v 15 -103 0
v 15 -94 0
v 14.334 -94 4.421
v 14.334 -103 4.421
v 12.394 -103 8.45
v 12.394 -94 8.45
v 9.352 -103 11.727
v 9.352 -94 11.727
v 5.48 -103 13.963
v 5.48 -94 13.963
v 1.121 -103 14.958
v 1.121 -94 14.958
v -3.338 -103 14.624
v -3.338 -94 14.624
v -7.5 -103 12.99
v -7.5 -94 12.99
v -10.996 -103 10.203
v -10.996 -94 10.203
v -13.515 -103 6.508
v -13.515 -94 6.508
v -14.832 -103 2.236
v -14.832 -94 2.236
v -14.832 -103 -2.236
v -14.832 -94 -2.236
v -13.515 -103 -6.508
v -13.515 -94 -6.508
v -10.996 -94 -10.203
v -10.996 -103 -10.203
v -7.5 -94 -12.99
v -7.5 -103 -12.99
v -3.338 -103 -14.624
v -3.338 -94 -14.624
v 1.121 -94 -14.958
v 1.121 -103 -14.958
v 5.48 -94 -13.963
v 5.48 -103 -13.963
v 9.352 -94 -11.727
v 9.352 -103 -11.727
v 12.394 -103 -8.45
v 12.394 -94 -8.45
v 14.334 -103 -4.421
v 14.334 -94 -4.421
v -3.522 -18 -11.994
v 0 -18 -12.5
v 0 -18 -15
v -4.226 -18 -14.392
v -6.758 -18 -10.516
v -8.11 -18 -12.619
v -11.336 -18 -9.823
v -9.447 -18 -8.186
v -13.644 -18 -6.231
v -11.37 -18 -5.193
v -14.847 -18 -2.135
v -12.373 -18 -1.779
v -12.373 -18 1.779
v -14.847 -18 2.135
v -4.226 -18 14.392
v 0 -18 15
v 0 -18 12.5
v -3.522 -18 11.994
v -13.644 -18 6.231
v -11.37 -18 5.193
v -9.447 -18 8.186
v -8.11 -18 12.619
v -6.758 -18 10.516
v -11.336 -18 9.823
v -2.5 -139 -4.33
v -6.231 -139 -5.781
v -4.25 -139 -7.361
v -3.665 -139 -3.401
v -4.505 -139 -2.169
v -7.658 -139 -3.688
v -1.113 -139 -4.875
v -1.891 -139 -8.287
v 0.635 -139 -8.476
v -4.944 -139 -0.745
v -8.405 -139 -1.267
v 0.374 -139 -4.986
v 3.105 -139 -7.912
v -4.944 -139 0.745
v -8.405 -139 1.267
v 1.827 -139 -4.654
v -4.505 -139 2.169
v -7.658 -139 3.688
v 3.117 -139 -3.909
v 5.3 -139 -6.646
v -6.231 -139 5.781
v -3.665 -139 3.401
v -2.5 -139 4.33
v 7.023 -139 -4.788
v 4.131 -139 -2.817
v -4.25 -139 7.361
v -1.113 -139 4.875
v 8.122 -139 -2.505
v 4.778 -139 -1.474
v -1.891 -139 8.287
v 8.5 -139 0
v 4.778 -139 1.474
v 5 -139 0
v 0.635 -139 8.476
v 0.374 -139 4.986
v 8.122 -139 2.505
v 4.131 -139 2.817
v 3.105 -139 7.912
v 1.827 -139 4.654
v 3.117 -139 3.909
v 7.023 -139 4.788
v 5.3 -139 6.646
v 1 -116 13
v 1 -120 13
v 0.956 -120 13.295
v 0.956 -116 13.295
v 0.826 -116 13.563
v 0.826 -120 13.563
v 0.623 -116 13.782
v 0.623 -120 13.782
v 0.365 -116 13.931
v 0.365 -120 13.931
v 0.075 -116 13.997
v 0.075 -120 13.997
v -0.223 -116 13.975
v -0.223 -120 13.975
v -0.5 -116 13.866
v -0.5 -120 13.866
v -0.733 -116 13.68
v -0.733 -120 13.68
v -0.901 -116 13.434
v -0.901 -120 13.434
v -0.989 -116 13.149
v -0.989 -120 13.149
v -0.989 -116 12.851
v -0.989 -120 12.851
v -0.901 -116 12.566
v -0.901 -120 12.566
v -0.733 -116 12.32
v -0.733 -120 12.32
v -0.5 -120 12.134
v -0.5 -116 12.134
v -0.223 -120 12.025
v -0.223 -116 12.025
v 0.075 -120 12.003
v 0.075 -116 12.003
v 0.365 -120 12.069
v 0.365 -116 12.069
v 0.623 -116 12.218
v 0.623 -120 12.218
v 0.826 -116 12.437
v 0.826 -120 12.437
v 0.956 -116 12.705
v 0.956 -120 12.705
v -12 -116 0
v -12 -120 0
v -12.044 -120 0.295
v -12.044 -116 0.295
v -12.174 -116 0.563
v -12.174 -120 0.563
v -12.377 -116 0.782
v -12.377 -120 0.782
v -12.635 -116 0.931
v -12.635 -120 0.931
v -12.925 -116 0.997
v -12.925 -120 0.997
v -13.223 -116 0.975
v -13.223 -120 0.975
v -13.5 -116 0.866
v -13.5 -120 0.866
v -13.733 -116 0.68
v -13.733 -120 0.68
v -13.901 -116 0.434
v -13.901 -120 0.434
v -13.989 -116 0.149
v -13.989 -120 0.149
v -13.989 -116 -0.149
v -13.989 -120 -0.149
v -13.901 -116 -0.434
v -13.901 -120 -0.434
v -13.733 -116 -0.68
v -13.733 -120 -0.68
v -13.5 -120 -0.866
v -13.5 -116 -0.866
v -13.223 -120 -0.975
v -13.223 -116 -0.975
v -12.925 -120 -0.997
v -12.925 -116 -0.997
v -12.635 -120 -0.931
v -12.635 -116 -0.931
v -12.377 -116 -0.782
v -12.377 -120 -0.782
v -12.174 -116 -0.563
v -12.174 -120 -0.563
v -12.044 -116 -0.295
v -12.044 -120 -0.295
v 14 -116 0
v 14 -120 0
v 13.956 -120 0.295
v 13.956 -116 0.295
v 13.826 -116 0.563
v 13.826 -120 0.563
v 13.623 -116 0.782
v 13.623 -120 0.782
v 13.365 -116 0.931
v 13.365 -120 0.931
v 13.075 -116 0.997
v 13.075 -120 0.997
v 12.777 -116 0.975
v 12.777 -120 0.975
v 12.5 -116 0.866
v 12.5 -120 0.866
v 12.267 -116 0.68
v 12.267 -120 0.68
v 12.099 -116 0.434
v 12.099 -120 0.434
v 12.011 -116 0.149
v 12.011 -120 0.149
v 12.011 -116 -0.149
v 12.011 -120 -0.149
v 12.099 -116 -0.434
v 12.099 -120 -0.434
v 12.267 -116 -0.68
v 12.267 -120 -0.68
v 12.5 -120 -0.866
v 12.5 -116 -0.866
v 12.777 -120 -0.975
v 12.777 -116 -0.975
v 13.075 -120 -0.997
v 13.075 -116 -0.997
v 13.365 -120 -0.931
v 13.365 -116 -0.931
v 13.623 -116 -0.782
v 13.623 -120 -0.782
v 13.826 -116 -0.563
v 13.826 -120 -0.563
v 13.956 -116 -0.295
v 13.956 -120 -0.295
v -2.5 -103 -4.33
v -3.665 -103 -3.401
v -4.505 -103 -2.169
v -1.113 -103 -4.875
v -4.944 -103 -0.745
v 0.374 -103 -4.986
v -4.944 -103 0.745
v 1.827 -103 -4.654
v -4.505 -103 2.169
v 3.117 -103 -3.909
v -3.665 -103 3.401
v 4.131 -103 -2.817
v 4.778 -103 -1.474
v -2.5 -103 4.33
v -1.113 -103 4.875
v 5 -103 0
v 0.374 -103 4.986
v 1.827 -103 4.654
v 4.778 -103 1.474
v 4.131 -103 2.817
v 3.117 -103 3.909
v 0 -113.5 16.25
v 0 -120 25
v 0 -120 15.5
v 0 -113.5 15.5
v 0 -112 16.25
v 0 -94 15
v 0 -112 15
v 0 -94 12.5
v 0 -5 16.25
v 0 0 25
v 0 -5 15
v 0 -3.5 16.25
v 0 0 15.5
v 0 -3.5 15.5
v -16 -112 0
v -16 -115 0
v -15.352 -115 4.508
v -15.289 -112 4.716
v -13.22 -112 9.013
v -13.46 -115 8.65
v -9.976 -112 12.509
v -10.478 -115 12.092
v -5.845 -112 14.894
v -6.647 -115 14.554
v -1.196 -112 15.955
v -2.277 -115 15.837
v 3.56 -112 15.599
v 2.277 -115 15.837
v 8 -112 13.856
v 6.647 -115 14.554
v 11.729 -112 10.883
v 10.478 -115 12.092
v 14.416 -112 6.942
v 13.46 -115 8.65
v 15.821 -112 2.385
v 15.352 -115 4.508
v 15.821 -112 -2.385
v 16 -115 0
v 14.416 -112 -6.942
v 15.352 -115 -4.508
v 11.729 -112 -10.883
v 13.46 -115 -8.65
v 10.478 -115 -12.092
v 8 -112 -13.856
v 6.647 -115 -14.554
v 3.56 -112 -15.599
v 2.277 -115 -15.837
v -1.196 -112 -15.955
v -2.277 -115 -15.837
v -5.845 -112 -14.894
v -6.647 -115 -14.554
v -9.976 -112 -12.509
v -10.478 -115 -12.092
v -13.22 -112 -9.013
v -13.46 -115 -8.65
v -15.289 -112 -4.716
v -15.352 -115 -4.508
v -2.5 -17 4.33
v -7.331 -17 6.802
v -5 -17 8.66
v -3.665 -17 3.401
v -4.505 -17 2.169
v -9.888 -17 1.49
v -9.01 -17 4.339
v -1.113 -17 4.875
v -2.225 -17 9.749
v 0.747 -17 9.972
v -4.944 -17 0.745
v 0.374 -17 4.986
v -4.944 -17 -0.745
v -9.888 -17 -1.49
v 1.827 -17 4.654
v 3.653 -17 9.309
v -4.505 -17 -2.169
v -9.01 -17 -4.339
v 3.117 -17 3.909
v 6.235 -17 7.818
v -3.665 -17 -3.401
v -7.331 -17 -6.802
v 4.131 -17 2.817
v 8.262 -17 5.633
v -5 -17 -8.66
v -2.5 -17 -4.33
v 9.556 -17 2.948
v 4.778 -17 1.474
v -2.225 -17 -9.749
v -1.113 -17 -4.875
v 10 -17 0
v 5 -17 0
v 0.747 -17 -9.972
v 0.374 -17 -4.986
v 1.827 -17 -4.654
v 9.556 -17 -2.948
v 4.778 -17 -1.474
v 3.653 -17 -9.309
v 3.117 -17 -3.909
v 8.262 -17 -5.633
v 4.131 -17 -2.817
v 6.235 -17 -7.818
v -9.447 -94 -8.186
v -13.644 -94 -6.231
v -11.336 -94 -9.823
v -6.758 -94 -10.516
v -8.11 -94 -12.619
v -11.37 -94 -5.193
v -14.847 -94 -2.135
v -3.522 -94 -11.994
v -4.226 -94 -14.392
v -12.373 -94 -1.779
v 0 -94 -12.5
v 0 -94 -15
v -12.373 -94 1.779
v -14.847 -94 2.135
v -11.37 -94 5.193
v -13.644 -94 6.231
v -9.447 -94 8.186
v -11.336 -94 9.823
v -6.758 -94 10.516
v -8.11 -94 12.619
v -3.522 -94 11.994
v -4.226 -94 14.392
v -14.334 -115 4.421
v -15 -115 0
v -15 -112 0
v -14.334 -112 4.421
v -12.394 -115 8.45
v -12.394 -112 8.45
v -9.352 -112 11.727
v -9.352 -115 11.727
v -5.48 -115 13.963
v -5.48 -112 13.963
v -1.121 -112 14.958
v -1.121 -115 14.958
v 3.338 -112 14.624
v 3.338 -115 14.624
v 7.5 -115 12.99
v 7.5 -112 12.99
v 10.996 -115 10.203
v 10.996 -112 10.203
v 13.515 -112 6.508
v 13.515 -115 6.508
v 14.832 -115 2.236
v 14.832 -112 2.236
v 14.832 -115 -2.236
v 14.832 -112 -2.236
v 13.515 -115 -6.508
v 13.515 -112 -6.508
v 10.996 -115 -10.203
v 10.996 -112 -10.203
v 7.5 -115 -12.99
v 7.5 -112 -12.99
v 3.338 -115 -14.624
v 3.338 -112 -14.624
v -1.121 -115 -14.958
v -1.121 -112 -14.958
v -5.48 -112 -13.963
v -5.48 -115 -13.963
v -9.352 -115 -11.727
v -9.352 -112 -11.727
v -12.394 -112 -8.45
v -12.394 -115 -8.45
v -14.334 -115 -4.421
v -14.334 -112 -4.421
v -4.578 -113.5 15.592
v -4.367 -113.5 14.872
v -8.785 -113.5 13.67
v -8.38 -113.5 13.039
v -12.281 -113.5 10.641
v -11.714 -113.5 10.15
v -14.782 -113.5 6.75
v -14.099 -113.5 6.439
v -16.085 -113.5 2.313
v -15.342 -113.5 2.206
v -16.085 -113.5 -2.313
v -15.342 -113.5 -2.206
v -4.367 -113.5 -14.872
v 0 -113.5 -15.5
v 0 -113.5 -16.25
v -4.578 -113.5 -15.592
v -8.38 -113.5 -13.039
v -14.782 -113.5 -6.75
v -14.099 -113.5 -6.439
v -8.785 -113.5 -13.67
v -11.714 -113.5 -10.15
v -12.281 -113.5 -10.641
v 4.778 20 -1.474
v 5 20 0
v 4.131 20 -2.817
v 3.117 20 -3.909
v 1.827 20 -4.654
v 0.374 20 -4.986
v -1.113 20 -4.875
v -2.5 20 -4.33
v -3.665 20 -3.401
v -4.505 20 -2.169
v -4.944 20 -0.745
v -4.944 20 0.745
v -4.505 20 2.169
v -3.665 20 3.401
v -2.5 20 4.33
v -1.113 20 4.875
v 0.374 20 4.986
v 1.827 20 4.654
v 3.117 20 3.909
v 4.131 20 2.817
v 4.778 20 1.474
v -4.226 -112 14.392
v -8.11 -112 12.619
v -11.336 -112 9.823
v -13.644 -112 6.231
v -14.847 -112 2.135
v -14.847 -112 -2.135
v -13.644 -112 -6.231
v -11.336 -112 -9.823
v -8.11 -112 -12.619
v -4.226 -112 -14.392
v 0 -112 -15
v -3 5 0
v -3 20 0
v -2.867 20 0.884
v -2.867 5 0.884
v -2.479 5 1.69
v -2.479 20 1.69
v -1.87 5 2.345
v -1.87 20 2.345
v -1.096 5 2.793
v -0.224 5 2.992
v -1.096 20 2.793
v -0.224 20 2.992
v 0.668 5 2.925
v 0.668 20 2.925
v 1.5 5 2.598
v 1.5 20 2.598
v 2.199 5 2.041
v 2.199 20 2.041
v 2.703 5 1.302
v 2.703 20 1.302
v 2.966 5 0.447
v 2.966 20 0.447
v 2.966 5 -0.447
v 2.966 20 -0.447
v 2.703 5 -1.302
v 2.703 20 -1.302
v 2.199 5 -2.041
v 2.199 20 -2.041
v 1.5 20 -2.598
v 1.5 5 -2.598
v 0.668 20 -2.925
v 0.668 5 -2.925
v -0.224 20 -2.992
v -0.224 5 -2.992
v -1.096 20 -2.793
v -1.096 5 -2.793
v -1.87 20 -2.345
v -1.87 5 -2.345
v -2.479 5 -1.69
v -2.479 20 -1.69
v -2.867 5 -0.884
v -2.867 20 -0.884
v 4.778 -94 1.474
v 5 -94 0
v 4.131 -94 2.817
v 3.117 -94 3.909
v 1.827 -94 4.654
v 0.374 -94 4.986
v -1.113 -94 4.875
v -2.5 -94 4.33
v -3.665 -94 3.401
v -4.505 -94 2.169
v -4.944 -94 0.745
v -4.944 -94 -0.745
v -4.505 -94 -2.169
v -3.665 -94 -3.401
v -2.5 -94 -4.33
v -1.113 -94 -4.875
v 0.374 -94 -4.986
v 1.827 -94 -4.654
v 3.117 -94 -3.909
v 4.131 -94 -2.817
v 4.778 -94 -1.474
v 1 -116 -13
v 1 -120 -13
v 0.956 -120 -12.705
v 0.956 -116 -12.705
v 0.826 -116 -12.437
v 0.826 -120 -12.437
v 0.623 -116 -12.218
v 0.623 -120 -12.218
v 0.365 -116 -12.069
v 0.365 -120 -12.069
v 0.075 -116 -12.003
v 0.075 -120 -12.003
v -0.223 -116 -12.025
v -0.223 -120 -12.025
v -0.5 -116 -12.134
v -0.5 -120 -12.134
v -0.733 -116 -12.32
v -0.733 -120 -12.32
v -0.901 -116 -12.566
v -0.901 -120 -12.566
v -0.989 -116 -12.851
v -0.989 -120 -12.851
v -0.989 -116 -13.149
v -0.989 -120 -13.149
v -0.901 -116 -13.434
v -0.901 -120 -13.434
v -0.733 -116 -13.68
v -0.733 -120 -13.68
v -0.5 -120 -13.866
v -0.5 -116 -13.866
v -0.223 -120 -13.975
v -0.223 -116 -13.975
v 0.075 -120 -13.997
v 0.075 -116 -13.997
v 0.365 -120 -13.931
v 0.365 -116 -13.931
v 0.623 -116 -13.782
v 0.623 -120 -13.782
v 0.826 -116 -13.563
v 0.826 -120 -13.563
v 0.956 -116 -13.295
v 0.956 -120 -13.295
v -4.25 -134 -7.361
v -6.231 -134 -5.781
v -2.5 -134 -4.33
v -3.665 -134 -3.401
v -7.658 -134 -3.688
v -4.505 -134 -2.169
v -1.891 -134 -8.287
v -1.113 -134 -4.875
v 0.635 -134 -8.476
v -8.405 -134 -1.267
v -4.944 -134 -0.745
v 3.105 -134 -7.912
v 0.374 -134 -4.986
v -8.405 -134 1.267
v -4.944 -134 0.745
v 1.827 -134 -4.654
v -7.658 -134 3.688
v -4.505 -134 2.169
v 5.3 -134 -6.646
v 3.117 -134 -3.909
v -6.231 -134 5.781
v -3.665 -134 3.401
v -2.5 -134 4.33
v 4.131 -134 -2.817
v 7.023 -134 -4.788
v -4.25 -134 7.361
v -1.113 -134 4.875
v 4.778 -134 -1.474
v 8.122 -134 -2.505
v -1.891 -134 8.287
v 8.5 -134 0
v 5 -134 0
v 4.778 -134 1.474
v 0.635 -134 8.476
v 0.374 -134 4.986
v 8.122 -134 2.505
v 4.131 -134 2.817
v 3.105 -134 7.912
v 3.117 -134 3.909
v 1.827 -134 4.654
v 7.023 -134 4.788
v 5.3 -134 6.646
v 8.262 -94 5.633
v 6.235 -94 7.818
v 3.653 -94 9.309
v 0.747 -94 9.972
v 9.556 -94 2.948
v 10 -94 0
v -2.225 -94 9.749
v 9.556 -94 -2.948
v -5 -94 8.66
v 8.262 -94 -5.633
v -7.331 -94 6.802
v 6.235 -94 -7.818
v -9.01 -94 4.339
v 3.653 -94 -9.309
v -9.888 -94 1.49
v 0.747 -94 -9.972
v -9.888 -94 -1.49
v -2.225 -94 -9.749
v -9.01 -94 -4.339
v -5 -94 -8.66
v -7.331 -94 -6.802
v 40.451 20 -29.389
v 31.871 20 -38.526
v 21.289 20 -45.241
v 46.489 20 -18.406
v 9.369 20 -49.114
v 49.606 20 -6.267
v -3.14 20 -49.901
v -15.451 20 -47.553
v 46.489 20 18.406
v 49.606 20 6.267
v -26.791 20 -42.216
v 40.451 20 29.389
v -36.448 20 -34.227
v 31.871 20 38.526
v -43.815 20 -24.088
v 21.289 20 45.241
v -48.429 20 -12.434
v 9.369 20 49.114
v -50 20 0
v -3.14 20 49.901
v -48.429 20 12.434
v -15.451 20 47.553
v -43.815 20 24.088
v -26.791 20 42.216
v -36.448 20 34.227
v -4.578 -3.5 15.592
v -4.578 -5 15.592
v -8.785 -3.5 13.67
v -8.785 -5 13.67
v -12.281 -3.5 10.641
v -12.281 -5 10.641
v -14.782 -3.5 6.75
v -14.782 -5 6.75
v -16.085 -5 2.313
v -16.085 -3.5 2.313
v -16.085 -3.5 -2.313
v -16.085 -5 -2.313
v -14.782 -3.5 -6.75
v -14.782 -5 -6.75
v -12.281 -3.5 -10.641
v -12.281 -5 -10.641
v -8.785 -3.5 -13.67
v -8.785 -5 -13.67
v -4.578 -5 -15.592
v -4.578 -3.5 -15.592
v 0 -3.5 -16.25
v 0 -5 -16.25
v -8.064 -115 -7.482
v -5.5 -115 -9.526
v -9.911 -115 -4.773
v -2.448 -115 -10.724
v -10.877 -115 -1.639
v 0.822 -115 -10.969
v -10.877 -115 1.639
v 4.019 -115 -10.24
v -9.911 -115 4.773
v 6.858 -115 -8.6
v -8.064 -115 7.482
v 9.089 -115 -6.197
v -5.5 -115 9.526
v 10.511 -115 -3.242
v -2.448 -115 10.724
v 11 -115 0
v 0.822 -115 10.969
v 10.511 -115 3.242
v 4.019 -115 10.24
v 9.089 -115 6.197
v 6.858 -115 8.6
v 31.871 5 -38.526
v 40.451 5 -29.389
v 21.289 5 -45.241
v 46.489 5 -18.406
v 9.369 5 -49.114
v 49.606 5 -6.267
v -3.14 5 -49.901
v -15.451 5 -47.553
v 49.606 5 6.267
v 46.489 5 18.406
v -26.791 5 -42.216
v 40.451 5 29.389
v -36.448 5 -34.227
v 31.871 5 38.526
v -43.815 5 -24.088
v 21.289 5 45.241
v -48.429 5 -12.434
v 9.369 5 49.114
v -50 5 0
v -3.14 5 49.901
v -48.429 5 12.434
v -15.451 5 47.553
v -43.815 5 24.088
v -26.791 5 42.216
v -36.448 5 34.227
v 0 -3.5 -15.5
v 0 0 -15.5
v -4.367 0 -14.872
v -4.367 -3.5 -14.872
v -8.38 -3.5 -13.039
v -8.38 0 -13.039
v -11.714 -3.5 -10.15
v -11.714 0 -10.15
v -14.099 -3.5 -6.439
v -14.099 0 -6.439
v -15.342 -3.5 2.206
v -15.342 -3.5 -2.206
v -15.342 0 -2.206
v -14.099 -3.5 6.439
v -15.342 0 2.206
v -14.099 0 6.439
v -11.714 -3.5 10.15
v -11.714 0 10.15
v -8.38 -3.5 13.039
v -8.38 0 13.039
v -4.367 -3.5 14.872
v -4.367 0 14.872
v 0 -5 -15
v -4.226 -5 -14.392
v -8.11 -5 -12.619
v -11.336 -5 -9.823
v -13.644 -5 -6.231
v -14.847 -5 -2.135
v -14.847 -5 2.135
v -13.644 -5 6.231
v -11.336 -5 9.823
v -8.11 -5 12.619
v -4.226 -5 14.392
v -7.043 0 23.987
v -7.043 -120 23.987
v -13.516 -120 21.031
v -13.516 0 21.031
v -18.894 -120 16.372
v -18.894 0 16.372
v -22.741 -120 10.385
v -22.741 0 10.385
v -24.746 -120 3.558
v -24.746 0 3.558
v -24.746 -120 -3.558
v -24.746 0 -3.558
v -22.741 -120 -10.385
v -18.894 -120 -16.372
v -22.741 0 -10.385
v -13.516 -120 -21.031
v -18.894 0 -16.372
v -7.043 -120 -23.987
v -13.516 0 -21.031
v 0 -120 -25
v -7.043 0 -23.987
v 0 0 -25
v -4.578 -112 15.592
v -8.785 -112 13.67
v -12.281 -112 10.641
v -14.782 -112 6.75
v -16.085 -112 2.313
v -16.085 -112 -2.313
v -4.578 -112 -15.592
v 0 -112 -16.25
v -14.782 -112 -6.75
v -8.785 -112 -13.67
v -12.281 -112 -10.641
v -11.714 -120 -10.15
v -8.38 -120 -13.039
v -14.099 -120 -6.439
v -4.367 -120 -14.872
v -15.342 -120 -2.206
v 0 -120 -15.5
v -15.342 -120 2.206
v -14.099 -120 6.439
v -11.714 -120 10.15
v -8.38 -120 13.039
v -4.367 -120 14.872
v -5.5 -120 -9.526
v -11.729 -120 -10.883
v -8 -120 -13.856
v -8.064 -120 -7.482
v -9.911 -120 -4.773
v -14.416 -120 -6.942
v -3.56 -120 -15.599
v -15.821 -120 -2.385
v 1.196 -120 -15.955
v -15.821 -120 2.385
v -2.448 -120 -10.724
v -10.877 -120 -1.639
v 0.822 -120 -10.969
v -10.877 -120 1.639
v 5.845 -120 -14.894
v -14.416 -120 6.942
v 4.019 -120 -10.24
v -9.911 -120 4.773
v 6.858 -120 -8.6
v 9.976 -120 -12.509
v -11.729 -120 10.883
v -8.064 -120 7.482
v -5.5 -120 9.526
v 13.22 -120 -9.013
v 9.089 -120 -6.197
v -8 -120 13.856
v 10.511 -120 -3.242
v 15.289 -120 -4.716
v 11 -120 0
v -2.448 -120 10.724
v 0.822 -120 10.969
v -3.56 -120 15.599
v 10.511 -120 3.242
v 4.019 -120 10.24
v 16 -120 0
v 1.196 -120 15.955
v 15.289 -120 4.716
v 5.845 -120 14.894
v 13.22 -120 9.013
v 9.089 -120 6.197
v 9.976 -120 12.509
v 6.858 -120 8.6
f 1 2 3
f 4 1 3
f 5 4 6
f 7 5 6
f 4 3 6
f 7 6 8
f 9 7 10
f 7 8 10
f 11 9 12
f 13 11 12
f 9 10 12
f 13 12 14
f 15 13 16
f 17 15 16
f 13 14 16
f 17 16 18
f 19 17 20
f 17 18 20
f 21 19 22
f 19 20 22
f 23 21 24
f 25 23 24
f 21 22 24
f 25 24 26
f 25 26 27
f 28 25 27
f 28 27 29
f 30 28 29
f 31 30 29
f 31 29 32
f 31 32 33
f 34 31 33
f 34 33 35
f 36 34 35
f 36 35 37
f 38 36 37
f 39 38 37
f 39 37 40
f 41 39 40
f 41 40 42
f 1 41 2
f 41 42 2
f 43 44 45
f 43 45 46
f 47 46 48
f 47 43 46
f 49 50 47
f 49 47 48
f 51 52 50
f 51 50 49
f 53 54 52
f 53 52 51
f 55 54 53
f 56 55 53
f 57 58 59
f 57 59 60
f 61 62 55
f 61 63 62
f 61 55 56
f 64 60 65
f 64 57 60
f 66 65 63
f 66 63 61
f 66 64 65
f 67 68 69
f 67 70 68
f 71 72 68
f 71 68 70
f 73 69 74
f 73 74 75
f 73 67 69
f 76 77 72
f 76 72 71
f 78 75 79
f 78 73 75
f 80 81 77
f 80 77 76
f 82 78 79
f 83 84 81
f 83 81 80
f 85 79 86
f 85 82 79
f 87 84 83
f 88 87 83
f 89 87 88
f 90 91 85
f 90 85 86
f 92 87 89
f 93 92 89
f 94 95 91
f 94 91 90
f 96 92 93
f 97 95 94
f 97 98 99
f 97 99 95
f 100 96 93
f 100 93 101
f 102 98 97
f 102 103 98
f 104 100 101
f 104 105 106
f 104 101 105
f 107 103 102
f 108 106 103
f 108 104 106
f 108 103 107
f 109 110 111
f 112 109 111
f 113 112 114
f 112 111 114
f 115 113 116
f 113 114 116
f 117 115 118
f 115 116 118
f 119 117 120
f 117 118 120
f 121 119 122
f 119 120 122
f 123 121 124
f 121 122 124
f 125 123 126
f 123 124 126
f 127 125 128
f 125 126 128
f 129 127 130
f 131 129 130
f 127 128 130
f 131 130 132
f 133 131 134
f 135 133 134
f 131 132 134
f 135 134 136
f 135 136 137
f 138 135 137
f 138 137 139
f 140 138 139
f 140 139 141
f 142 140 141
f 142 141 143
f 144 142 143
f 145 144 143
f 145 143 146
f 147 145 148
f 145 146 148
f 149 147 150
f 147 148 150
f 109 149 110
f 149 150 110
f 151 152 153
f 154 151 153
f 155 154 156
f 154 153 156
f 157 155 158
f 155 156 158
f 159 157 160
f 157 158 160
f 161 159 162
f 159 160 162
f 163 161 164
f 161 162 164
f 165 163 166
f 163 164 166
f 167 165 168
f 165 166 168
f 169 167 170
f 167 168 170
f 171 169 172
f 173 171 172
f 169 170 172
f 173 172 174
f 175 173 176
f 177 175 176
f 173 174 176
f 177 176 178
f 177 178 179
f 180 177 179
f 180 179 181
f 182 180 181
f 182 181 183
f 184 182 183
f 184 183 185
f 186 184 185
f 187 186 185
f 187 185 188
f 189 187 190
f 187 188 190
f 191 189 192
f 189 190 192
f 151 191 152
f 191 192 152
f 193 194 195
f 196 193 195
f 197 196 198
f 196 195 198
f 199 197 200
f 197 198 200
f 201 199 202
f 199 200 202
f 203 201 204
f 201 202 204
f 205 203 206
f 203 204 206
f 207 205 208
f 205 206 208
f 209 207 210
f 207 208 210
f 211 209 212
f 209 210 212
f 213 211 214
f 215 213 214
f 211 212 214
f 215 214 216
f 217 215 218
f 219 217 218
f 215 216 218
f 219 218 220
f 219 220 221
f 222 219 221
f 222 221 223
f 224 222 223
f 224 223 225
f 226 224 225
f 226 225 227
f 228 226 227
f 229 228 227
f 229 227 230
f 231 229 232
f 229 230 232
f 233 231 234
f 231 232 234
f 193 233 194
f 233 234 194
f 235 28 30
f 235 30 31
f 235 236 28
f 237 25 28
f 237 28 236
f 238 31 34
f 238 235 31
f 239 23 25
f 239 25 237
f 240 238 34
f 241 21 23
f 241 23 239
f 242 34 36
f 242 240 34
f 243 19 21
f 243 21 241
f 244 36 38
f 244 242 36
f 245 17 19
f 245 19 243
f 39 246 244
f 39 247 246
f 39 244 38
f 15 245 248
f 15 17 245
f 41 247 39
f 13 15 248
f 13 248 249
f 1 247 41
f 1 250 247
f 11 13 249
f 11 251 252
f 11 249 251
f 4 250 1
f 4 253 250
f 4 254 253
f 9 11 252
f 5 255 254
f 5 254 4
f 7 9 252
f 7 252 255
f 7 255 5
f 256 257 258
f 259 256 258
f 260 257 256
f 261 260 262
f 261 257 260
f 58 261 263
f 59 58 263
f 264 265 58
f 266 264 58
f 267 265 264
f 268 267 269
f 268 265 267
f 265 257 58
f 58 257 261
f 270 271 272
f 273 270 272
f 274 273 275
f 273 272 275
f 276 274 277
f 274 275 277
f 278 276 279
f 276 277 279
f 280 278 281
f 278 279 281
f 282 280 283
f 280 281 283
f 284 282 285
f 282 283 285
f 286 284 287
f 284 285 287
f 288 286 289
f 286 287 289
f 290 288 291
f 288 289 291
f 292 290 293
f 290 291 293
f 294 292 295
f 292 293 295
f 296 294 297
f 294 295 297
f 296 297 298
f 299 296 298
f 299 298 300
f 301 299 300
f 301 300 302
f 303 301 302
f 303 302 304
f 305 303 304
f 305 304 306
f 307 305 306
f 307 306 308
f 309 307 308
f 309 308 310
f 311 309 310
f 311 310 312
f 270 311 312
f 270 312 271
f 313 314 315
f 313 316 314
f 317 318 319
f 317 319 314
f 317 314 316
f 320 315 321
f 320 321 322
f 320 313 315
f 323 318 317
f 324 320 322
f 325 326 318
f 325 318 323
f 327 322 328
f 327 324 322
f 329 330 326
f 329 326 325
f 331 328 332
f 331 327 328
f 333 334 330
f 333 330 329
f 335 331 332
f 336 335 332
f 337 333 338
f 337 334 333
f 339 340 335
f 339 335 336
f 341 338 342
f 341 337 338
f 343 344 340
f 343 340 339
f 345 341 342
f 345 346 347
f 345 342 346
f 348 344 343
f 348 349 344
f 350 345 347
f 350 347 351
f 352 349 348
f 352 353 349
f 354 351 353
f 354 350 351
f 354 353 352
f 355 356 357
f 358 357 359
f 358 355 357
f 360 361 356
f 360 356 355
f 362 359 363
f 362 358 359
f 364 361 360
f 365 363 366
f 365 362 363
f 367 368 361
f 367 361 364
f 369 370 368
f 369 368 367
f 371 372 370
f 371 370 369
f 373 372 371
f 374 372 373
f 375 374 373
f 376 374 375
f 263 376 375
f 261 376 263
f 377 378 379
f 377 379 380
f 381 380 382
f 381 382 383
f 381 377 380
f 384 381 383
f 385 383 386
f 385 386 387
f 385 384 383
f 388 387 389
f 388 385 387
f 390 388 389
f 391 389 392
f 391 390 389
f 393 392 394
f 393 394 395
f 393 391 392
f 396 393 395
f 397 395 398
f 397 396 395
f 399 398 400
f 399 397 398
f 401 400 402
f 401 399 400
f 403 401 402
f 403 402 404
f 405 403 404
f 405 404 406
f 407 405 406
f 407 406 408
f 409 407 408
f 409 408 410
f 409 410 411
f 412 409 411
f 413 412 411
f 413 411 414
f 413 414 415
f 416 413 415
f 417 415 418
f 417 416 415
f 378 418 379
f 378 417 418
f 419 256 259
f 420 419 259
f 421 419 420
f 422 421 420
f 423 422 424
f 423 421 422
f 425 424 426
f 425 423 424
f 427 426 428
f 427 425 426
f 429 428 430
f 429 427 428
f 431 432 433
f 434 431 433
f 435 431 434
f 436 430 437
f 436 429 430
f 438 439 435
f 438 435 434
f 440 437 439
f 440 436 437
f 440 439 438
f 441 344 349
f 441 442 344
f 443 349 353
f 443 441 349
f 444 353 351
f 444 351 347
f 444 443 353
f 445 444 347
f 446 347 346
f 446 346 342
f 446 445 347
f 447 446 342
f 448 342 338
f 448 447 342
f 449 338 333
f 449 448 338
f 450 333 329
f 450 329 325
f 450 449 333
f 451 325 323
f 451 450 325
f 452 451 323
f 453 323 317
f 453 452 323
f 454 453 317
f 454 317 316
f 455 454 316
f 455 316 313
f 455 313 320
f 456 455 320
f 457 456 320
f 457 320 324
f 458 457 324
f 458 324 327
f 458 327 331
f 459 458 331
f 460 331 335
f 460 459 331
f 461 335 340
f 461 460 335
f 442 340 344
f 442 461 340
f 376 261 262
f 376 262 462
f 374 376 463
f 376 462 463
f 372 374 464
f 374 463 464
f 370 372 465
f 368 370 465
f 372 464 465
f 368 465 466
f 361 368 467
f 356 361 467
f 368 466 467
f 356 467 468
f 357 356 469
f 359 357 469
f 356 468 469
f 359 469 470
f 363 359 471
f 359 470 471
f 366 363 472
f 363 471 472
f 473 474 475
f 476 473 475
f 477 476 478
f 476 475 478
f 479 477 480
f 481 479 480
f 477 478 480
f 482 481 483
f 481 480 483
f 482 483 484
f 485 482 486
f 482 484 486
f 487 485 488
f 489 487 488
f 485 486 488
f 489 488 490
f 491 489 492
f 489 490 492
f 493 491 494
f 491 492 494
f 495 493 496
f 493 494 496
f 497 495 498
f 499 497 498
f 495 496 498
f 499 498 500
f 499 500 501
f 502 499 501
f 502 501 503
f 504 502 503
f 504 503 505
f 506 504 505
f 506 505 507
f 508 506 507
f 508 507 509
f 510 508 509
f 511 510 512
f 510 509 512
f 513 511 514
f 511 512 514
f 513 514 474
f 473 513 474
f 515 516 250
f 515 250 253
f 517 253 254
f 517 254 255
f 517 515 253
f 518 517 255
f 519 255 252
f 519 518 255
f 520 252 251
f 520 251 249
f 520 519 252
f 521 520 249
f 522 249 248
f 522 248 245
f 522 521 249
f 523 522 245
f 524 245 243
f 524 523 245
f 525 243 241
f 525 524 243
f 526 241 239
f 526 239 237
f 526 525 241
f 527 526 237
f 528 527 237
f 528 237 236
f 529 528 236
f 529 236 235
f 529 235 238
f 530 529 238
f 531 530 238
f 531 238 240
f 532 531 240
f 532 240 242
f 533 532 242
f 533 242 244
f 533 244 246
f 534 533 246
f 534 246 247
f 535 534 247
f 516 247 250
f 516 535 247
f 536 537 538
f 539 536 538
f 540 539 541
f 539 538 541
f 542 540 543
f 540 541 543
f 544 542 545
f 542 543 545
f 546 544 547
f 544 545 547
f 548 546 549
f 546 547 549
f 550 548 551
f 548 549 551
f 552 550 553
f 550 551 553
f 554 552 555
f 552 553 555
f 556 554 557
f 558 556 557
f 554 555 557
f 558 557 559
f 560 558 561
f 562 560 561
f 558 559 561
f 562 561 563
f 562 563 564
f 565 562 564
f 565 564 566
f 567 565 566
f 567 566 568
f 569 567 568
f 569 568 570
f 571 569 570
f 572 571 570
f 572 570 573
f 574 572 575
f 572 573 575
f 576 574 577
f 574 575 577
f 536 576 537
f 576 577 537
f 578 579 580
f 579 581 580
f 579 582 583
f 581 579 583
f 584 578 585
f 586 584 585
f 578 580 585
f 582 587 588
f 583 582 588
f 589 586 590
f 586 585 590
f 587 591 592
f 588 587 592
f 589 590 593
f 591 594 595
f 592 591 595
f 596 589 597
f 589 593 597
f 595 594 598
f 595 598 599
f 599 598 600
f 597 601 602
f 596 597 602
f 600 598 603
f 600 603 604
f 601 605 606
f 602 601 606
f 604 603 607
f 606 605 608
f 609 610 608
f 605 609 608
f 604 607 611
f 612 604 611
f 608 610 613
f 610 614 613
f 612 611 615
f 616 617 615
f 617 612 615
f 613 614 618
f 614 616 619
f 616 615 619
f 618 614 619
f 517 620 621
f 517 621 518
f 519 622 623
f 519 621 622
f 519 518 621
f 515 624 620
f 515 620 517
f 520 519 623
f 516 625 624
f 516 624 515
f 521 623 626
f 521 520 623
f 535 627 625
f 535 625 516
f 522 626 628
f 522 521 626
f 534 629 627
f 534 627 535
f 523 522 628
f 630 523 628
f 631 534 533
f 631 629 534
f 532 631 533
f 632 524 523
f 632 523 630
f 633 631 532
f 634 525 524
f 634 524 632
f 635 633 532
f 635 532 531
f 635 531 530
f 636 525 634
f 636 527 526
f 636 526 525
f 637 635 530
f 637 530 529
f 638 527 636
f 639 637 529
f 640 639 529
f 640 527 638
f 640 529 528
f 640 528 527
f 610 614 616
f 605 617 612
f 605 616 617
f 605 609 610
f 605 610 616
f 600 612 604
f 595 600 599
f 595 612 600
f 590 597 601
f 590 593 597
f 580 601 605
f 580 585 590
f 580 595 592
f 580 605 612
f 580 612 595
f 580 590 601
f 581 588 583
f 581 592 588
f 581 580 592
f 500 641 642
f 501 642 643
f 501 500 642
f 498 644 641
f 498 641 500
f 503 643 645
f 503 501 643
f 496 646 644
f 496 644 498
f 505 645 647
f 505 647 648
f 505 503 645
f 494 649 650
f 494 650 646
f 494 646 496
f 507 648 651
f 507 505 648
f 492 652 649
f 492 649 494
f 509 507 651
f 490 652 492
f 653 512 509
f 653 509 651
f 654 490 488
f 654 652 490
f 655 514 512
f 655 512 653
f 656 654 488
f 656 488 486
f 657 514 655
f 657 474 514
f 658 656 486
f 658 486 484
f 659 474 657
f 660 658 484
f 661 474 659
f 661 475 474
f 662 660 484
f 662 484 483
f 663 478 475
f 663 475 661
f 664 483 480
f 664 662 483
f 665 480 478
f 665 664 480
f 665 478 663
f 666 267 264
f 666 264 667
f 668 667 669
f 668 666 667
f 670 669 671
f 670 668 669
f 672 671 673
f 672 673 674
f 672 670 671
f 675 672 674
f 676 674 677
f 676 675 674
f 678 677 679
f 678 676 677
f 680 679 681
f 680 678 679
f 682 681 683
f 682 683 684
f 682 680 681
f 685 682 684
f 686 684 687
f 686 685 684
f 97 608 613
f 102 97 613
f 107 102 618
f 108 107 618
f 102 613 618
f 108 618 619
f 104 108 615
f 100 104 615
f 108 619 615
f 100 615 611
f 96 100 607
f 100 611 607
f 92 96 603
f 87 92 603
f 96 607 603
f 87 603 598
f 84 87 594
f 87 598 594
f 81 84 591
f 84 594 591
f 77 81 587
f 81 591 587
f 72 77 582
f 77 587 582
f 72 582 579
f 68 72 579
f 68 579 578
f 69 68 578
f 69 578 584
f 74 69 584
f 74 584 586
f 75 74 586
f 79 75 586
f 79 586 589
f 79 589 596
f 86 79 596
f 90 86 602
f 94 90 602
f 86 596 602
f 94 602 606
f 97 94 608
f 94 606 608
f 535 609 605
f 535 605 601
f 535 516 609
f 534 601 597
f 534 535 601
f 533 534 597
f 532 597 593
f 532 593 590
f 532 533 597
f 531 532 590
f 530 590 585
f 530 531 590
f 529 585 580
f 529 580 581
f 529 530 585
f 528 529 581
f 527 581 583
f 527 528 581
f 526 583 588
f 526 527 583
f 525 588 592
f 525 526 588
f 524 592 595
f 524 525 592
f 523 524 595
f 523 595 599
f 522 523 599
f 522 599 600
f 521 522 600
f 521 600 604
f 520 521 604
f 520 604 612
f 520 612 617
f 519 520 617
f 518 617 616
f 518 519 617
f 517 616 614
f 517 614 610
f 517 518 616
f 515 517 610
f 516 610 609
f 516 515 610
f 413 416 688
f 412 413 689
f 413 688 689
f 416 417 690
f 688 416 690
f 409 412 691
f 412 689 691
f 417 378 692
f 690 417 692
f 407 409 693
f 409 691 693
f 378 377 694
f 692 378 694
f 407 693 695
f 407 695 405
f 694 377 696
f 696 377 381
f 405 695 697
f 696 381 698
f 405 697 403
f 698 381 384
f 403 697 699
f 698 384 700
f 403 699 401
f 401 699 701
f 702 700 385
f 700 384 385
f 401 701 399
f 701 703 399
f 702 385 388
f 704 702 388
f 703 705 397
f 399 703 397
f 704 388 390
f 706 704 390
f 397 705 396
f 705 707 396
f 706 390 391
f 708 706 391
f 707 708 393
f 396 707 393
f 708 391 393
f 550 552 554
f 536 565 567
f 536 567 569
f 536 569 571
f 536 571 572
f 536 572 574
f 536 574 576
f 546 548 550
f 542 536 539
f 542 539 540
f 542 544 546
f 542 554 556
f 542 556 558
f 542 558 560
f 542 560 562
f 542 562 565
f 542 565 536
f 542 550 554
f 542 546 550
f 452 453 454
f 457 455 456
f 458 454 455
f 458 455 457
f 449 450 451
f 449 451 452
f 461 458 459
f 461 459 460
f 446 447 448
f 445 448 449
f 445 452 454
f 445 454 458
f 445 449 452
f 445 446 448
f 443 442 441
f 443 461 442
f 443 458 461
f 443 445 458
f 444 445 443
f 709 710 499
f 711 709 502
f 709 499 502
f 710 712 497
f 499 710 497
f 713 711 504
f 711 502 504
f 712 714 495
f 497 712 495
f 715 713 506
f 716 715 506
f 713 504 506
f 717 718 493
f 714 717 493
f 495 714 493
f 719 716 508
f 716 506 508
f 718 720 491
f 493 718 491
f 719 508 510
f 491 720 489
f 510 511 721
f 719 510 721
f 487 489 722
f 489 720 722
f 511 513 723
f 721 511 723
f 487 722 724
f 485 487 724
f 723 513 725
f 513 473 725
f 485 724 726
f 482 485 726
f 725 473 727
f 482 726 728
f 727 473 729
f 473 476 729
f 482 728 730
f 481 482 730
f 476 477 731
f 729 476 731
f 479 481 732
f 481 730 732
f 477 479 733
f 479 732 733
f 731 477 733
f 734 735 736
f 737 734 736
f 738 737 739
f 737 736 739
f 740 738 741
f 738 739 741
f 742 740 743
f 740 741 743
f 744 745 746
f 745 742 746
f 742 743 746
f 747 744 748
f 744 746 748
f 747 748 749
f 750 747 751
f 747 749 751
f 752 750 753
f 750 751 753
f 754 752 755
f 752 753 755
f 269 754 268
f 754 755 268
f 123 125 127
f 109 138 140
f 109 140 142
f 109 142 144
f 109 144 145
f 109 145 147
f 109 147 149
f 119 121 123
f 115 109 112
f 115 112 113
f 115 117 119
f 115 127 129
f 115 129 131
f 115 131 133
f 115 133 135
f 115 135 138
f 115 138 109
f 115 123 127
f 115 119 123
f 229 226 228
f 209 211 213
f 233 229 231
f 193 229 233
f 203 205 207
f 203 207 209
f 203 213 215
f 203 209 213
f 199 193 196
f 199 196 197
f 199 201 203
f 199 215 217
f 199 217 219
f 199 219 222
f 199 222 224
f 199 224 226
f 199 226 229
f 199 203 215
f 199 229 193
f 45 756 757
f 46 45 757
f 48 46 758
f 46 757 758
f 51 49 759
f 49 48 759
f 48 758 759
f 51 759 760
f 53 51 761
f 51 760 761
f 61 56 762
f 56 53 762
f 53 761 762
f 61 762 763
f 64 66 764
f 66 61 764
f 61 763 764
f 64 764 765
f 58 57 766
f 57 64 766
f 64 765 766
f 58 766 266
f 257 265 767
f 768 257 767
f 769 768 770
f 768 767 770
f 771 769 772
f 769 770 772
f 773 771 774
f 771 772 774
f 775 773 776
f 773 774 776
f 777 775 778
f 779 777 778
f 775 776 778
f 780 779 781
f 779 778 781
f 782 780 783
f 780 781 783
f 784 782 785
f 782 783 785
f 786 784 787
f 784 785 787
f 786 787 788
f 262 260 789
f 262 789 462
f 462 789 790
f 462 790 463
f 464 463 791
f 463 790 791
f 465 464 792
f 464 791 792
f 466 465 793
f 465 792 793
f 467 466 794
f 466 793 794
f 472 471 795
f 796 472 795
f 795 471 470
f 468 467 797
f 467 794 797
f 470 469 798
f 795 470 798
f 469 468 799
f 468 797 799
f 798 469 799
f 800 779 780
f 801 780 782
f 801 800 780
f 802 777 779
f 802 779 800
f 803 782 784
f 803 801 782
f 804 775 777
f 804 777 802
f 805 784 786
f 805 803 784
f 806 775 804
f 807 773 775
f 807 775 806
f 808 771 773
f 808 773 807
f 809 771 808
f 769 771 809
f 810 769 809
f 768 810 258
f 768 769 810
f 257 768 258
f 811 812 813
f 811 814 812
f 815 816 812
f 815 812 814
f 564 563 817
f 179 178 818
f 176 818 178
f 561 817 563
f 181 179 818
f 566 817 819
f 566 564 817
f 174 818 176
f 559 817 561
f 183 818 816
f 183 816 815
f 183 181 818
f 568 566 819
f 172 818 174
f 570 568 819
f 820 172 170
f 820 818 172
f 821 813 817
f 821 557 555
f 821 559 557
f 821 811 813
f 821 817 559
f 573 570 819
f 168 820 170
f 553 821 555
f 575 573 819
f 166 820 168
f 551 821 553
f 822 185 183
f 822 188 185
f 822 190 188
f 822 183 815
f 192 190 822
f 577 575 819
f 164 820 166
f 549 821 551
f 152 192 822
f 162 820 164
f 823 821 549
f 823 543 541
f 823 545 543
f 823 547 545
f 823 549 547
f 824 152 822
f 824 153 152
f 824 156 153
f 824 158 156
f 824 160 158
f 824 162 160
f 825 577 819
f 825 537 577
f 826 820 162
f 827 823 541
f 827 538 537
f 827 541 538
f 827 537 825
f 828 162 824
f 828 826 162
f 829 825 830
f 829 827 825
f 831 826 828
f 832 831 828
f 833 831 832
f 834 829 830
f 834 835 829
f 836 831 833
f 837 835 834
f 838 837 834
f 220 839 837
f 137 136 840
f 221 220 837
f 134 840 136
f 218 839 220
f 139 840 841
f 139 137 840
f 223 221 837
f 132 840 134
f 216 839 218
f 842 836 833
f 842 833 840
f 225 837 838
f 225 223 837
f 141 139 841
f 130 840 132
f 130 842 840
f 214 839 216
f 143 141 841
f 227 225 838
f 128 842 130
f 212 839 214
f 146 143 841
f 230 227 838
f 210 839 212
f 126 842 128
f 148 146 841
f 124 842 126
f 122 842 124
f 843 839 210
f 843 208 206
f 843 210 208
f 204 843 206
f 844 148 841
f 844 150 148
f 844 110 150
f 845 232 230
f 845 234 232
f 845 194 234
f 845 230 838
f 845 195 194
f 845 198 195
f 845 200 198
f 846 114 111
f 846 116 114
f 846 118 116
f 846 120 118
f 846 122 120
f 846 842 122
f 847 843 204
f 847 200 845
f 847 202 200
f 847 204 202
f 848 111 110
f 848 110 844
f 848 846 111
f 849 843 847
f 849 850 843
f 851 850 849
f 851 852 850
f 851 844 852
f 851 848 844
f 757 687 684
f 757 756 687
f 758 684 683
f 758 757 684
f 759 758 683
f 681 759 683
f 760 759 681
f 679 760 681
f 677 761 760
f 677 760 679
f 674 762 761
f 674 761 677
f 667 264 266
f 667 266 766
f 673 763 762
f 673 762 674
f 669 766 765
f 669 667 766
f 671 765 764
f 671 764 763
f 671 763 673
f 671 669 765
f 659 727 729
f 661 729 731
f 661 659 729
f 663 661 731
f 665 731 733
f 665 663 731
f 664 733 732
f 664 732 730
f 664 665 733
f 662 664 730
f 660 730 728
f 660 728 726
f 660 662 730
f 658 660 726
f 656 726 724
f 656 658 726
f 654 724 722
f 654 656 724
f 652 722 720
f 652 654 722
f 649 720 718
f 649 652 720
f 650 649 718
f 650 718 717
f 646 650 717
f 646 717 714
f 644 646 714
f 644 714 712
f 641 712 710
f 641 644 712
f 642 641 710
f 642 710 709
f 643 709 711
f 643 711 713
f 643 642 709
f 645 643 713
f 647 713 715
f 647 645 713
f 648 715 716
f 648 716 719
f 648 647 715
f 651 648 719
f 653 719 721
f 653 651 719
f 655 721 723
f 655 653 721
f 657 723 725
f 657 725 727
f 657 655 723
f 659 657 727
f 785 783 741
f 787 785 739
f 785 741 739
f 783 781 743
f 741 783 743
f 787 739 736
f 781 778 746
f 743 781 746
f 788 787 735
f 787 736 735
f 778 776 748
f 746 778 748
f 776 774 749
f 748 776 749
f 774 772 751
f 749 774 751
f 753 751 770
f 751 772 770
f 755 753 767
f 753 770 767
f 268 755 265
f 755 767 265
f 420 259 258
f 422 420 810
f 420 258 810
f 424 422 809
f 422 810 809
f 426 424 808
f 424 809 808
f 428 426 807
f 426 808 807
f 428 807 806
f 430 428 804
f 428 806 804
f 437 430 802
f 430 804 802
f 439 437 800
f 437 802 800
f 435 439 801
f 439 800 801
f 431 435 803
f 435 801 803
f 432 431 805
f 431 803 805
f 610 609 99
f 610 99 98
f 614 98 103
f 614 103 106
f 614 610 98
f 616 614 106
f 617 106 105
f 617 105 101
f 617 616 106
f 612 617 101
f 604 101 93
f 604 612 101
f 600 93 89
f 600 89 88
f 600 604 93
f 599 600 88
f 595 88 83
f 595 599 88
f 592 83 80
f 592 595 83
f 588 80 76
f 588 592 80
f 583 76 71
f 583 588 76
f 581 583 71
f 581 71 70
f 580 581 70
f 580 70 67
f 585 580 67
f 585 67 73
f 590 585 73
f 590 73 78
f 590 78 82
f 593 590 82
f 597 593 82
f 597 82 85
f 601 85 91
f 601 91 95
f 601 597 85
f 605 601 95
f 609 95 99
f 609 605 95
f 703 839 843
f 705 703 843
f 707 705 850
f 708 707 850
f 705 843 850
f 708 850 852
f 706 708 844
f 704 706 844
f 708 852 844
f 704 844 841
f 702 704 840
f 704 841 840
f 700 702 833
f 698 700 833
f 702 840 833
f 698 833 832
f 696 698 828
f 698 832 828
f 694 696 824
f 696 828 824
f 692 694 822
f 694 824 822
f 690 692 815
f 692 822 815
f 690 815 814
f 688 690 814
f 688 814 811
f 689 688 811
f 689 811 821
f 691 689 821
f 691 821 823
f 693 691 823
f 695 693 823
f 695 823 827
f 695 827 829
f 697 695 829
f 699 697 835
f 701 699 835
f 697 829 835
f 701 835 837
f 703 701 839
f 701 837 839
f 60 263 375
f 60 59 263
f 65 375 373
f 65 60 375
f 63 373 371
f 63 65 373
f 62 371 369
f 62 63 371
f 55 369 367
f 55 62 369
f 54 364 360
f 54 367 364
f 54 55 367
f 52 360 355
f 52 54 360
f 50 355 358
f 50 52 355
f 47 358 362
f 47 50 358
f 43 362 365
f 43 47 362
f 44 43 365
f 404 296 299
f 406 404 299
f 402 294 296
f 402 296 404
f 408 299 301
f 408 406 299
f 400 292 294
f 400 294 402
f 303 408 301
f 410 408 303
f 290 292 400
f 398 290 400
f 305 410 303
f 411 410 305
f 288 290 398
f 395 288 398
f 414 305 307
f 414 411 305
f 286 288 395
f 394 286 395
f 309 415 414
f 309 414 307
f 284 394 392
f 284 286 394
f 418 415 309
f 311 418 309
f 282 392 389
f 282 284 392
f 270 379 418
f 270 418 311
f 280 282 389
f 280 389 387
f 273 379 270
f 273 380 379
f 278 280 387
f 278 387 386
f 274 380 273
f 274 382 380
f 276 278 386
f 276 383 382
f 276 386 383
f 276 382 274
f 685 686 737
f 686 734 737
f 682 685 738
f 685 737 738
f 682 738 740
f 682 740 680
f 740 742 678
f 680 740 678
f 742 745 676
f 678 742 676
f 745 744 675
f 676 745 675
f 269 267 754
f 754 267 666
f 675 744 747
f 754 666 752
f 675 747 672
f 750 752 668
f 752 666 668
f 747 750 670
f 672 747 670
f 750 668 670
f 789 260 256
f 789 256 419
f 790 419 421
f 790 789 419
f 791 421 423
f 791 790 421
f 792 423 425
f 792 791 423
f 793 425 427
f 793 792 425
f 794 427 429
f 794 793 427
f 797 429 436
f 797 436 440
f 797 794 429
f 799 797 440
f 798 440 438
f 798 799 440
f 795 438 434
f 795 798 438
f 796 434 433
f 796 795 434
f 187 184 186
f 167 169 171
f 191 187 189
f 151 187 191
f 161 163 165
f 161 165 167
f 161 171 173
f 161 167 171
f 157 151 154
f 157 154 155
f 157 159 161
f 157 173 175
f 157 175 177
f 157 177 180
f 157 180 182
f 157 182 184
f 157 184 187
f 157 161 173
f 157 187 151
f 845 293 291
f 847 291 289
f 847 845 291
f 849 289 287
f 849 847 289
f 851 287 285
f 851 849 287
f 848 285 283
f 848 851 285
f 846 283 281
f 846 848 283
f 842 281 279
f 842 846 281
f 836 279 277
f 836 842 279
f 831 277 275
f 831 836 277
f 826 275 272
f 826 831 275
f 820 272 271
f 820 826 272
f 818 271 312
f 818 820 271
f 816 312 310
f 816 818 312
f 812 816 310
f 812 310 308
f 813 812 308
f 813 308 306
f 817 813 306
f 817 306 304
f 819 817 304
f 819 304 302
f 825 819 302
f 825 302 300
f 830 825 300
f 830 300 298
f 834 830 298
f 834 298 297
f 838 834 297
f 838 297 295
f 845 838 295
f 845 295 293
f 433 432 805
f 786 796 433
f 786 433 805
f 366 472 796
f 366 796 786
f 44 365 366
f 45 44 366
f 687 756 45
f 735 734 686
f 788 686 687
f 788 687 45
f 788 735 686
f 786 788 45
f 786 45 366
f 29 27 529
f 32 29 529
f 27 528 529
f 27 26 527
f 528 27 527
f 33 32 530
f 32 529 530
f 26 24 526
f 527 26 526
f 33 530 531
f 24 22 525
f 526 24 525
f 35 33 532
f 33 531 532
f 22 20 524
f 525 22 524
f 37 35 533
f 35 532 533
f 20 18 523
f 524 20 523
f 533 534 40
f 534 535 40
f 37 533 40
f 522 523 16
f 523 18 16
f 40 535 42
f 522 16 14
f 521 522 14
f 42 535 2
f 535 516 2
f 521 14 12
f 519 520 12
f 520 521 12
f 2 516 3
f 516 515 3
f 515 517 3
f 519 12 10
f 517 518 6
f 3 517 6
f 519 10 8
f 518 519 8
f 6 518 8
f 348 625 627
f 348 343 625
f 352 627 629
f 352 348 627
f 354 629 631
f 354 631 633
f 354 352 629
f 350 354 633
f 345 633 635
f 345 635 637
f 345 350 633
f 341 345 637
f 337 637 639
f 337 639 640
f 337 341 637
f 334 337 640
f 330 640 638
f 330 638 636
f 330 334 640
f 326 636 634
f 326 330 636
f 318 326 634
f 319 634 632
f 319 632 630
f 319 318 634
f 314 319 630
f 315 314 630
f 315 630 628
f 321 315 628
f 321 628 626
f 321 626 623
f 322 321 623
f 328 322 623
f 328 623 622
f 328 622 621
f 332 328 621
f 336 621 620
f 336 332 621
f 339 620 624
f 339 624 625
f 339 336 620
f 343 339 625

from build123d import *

# Parameters (mm, degrees)
F0_R      = 25
F0_R_2    = 12.5
F1_DEPTH  = 120
F2_R      = 15
F3_DEPTH  = 26
F4_R      = 15
F5_DEPTH  = 18
F6_R      = 15
F6_R_2    = 5
F7_DEPTH  = 9
F8_R      = 15.5
F9_DEPTH  = 5
F10_W     = 2.0336253941
F10_H     = 1.5
F12_R     = 15.5
F13_DEPTH = 8
F14_W     = 1.5
F14_H     = 3.402102628
F16_R     = 16
F16_R_2   = 11
F17_DEPTH = 5
F18_R     = 1
F19_DEPTH = 4
F20_R     = 16
F20_R_2   = 15
F21_DEPTH = 3
F24_R     = 50
F24_R_2   = 3
F25_DEPTH = 15
F26_R     = 8.5
F26_R_2   = 5
F27_DEPTH = 5
F29_DEPTH = 25
F30_W     = 78.1155228615
F30_H     = 117.9010644555
F31_DEPTH = 148.1


with BuildPart() as f1:
    # F0 (on Front) → F1 (new body)
    with BuildSketch(Plane.XZ):
        Circle(F0_R)
        Circle(F0_R_2, mode=Mode.SUBTRACT)
    extrude(amount=F1_DEPTH)

    # F2 (on face) → F3 (cut)
    with BuildSketch(Plane.XZ.offset(120)):
        Circle(F2_R)
    extrude(amount=-F3_DEPTH, mode=Mode.SUBTRACT)

    # F4 (on face) → F5 (cut)
    with BuildSketch(Plane(origin=(0, 0, 0), x_dir=(-1, 0, 0), z_dir=(0, 1, 0))):
        Circle(F4_R)
    extrude(amount=-F5_DEPTH, mode=Mode.SUBTRACT)

    # F8 (on face) → F9 (cut)
    with BuildSketch(Plane(origin=(0, 0, 0), x_dir=(-1, 0, 0), z_dir=(0, 1, 0))):
        Circle(F8_R)
    extrude(amount=-F9_DEPTH, mode=Mode.SUBTRACT)

    # F10 (on Top) → F11 (revolve, cut)
    with BuildSketch(Plane.XY):
        with Locations((15.2331873029, -4.25)):
            Rectangle(F10_W, F10_H)
    revolve(axis=Axis((0, -4.2630452663, 0), (0, -1, 0)), mode=Mode.SUBTRACT)

    # F12 (on face) → F13 (cut)
    with BuildSketch(Plane.XZ.offset(120)):
        Circle(F12_R)
    extrude(amount=-F13_DEPTH, mode=Mode.SUBTRACT)

    # F14 (on Right) → F15 (revolve, cut)
    with BuildSketch(Plane.YZ):
        with Locations((-112.75, 14.548948686)):
            Rectangle(F14_W, F14_H)
    revolve(axis=Axis((0, -92.9998606443, 0), (0, -1, 0)), mode=Mode.SUBTRACT)

    # F28 (on face) → F29 (cut)
    with BuildSketch(Plane.XZ.offset(-5)):
        with BuildLine():
            ThreePointArc((50, 0), (35.3553390593, 35.3553390593), (0, 50))
            Line((0, 50), (0, 3))
            ThreePointArc((0, 3), (2.1213203436, 2.1213203436), (3, 0))
            ThreePointArc((3, 0), (2.1213203436, -2.1213203436), (0, -3))
            Line((0, -3), (0, -50))
            ThreePointArc((0, -50), (35.3553390593, -35.3553390593), (50, 0))
        make_face()
    extrude(amount=F29_DEPTH, mode=Mode.SUBTRACT)

    # F30 (on face) → F31 (cut)
    with BuildSketch(Plane.XZ.offset(120)):
        with Locations((39.0577614307, -4.8518963158)):
            Rectangle(F30_W, F30_H)
    extrude(amount=-F31_DEPTH, mode=Mode.SUBTRACT)


with BuildPart() as f7:
    # F6 (on face) → F7 (new body)
    with BuildSketch(Plane.XZ.offset(94)):
        Circle(F6_R)
        Circle(F6_R_2, mode=Mode.SUBTRACT)
    extrude(amount=F7_DEPTH)


with BuildPart() as f17:
    # F16 (on face) → F17 (new body)
    with BuildSketch(Plane.XZ.offset(120)):
        Circle(F16_R)
        Circle(F16_R_2, mode=Mode.SUBTRACT)
    extrude(amount=-F17_DEPTH)

    # F18 (on face) → F19 (cut)
    with BuildSketch(Plane.XZ.offset(120)):
        with Locations((0, 13)):
            Circle(F18_R)
        with Locations((0, -13)):
            Circle(F18_R)
        with Locations((-13, 0)):
            Circle(F18_R)
        with Locations((13, 0)):
            Circle(F18_R)
    extrude(amount=-F19_DEPTH, mode=Mode.SUBTRACT)

    # F20 (on face) → F21 (join)
    with BuildSketch(Plane(origin=(0, -115, 0), x_dir=(-1, 0, 0), z_dir=(0, 1, 0))):
        Circle(F20_R)
        Circle(F20_R_2, mode=Mode.SUBTRACT)
    extrude(amount=F21_DEPTH)


with BuildPart() as f23:
    # F22 (on Top) → F23 (revolve)
    with BuildSketch(Plane.XY):
        Polygon((0, 20), (0, 0), (0, -134), (5, -134), (5, -94), (10, -94), (10, -17), (5, -17), (5, 20), align=None)
    revolve(axis=Axis((0, 24.7967958012, 0), (0, 1, 0)))


with BuildPart() as f25:
    # F24 (on face) → F25 (new body)
    with BuildSketch(Plane(origin=(0, 20, 0), x_dir=(-1, 0, 0), z_dir=(0, 1, 0))):
        Circle(F24_R)
        Circle(F24_R_2, mode=Mode.SUBTRACT)
    extrude(amount=-F25_DEPTH)


with BuildPart() as f27:
    # F26 (on face) → F27 (new body)
    with BuildSketch(Plane.XZ.offset(134)):
        Circle(F26_R)
        Circle(F26_R_2, mode=Mode.SUBTRACT)
    extrude(amount=F27_DEPTH)


solid = Compound([f1.part, f7.part, f17.part, f23.part, f25.part, f27.part])
